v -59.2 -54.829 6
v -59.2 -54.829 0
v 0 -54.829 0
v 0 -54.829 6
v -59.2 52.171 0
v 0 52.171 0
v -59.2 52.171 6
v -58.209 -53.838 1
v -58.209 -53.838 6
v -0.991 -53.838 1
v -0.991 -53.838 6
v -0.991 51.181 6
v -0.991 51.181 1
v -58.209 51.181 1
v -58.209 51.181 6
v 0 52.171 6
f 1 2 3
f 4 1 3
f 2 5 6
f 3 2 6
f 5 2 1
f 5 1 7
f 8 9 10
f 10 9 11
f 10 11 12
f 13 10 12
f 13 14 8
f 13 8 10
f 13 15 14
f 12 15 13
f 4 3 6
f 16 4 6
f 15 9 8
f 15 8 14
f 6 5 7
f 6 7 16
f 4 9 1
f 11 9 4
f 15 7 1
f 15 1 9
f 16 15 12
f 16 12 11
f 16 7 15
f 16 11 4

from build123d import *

# Parameters (mm, degrees)
F0_W     = 59.2
F0_H     = 107
F1_DEPTH = 6
F2_W     = 57.2188
F2_H     = 105.0188
F3_DEPTH = 5


with BuildPart() as f1:
    # F0 (on Top) → F1 (new body)
    with BuildSketch(Plane.XY):
        with Locations((-29.6, -1.328537)):
            Rectangle(F0_W, F0_H)
    extrude(amount=F1_DEPTH)

    # F2 (on face) → F3 (cut)
    with BuildSketch(Plane.XY.offset(6)):
        with Locations((-29.6, -1.328537)):
            Rectangle(F2_W, F2_H)
    extrude(amount=-F3_DEPTH, mode=Mode.SUBTRACT)


solid = f1.part
